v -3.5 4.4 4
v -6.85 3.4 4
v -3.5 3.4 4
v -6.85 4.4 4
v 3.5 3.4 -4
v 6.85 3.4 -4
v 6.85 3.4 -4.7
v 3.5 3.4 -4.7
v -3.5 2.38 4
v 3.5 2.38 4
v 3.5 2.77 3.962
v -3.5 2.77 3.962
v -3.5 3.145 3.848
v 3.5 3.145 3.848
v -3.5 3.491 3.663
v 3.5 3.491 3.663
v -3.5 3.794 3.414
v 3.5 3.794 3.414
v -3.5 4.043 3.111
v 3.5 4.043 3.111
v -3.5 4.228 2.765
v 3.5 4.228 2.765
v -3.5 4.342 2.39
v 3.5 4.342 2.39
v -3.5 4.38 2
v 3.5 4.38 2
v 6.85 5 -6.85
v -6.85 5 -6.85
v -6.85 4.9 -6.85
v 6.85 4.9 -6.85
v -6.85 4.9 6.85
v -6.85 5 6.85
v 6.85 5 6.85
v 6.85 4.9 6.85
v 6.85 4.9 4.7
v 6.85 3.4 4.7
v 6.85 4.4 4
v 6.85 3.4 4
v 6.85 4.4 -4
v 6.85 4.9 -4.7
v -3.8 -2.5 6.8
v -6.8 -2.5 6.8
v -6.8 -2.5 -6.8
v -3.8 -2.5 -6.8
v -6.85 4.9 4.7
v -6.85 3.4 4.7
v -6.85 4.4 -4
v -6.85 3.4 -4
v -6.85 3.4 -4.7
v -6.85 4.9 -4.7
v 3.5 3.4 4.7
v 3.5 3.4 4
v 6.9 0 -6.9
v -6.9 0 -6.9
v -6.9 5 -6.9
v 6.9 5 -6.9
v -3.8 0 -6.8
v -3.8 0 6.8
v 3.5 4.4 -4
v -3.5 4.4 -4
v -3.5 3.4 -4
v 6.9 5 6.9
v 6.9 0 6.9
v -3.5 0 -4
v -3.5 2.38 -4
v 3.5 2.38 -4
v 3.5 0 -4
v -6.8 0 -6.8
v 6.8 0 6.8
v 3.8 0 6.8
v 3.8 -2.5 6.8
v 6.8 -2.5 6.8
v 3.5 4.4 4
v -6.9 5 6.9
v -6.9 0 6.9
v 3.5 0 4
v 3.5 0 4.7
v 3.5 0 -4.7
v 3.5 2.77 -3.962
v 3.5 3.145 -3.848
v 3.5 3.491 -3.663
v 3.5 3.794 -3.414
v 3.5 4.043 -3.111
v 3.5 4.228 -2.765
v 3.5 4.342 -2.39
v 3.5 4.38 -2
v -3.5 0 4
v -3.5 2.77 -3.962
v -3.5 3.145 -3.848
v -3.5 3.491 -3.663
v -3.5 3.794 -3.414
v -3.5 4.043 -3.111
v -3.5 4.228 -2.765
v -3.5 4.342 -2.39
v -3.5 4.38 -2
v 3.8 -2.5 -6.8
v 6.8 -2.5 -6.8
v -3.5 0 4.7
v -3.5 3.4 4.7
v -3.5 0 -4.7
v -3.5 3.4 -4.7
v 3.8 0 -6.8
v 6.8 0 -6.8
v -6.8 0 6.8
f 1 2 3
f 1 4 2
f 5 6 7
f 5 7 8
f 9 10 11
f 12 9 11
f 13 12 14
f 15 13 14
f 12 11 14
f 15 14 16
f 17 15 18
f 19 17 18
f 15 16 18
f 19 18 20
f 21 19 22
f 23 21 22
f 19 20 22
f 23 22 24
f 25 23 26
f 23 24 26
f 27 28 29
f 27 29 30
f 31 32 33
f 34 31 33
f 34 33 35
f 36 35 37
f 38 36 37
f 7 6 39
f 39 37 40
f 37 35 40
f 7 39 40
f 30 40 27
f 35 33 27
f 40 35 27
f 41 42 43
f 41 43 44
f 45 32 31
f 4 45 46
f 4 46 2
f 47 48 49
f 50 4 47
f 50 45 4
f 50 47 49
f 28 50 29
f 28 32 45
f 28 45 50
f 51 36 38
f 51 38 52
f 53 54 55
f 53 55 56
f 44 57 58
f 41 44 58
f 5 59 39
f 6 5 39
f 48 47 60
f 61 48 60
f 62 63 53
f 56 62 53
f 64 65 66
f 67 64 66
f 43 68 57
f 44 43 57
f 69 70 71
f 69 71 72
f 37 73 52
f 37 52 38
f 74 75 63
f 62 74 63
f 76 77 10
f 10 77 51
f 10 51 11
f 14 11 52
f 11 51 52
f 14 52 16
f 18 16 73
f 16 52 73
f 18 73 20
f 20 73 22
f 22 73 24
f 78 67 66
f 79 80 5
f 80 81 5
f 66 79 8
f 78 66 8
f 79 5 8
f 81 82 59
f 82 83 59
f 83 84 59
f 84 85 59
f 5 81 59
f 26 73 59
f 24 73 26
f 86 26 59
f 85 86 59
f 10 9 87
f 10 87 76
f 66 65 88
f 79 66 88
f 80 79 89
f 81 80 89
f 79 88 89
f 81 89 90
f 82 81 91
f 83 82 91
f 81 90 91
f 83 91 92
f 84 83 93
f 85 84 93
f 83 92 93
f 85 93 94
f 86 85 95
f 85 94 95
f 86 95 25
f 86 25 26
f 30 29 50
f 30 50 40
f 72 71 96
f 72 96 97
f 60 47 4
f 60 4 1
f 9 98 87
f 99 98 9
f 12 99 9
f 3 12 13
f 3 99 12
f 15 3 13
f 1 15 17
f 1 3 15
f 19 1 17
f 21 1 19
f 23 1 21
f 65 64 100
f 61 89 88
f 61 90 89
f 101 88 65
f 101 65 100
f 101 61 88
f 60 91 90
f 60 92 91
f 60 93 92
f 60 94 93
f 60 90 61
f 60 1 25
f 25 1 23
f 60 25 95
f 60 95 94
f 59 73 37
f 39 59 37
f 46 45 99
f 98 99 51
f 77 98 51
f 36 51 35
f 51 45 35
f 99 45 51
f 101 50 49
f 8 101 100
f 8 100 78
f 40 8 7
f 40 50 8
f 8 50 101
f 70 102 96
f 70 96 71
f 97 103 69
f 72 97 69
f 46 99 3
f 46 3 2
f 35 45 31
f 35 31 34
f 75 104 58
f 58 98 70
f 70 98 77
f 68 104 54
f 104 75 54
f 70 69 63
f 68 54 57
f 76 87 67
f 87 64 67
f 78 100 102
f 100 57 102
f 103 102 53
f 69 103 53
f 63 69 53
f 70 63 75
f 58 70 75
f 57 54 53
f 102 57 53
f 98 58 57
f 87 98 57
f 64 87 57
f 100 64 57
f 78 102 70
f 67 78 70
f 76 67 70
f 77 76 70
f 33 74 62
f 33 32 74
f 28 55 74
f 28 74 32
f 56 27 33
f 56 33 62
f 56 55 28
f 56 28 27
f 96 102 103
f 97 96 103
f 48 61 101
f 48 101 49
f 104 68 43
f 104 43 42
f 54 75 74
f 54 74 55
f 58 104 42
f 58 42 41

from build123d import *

# Parameters (mm, degrees)
ESBO_O1_W                = 13.8
ESBO_O1_H                = 13.8
RESSALTO_EXTRUS_O1_DEPTH = 5
ESBO_O3_W                = 3
ESBO_O3_H                = 13.6
RESSALTO_EXTRUS_O3_DEPTH = 2.5
ESBO_O4_W                = 13.7
ESBO_O4_H                = 13.7
CORTE_EXTRUS_O1_DEPTH    = 0.1
ESBO_O5_W                = 13.7
ESBO_O5_H                = 9.4
CORTE_EXTRUS_O2_DEPTH    = 0.5
ESBO_O6_W                = 13.7
ESBO_O6_H                = 0.7
CORTE_EXTRUS_O3_DEPTH    = 1
ESBO_O7_W                = 7
ESBO_O7_H                = 0.7
CORTE_EXTRUS_O4_DEPTH    = 10
ESBO_O8_W                = 7
ESBO_O8_H                = 8
CORTE_EXTRUS_O5_DEPTH    = 0.02
FILETE1_R                = 2


with BuildPart() as part:
    # Esboço1 → Ressalto-extrusão1 (new body)
    with BuildSketch(Plane(origin=(0, 0, 0), x_dir=(1, 0, 0), z_dir=(0, 1, 0))):
        Rectangle(ESBO_O1_W, ESBO_O1_H)
    extrude(amount=RESSALTO_EXTRUS_O1_DEPTH)

    # Esboço3 → Ressalto-extrusão3 (add)
    with BuildSketch(Plane.XZ):
        with Locations((-5.3, 0)):
            Rectangle(ESBO_O3_W, ESBO_O3_H)
        with Locations((5.3, 0)):
            Rectangle(ESBO_O3_W, ESBO_O3_H)
    extrude(amount=RESSALTO_EXTRUS_O3_DEPTH)

    # Esboço4 → Corte-extrusão1 (cut)
    with BuildSketch(Plane(origin=(0, 5, 0), x_dir=(1, 0, 0), z_dir=(0, 1, 0))):
        Rectangle(ESBO_O4_W, ESBO_O4_H)
    extrude(amount=-CORTE_EXTRUS_O1_DEPTH, mode=Mode.SUBTRACT)

    # Esboço5 → Corte-extrusão2 (cut)
    with BuildSketch(Plane(origin=(0, 4.9, 0), x_dir=(1, 0, 0), z_dir=(0, 1, 0))):
        Rectangle(ESBO_O5_W, ESBO_O5_H)
    extrude(amount=-CORTE_EXTRUS_O2_DEPTH, mode=Mode.SUBTRACT)

    # Esboço6 → Corte-extrusão3 (cut)
    with BuildSketch(Plane(origin=(0, 4.4, 0), x_dir=(-1, 0, 0), z_dir=(0, 1, 0))):
        with Locations((0, -4.35)):
            Rectangle(ESBO_O6_W, ESBO_O6_H)
        with Locations((0, 4.35)):
            Rectangle(ESBO_O6_W, ESBO_O6_H)
    extrude(amount=-CORTE_EXTRUS_O3_DEPTH, mode=Mode.SUBTRACT)

    # Esboço7 → Corte-extrusão4 (cut)
    with BuildSketch(Plane(origin=(0, 3.4, 0), x_dir=(1, 0, 0), z_dir=(0, 1, 0))):
        with Locations((0, 4.35)):
            Rectangle(ESBO_O7_W, ESBO_O7_H)
        with Locations((0, -4.35)):
            Rectangle(ESBO_O7_W, ESBO_O7_H)
    extrude(amount=-CORTE_EXTRUS_O4_DEPTH, mode=Mode.SUBTRACT)

    # Esboço8 → Corte-extrusão5 (cut)
    with BuildSketch(Plane(origin=(0, 4.4, 0), x_dir=(1, 0, 0), z_dir=(0, 1, 0))):
        Rectangle(ESBO_O8_W, ESBO_O8_H)
    extrude(amount=-CORTE_EXTRUS_O5_DEPTH, mode=Mode.SUBTRACT)

    # Filete1
    # the kernel refuses this fillet: 2 mm, written as the material it takes off along each edge
    with BuildSketch(Plane(origin=(-3.5, 4.38, -4), x_dir=(0, -1, 0), z_dir=(1, 0, 0)), Plane(origin=(3.5, 4.38, 4), x_dir=(0, -1, 0), z_dir=(-1, 0, 0))) as filete1_piece_1:
        with BuildLine():
            CenterArc((FILETE1_R, -FILETE1_R), FILETE1_R, 90, 90)
            Line((0, -FILETE1_R), (0, 0))
            Line((0, 0), (FILETE1_R, 0))
        make_face()
    extrude(amount=7, mode=Mode.SUBTRACT)


solid = part.part
